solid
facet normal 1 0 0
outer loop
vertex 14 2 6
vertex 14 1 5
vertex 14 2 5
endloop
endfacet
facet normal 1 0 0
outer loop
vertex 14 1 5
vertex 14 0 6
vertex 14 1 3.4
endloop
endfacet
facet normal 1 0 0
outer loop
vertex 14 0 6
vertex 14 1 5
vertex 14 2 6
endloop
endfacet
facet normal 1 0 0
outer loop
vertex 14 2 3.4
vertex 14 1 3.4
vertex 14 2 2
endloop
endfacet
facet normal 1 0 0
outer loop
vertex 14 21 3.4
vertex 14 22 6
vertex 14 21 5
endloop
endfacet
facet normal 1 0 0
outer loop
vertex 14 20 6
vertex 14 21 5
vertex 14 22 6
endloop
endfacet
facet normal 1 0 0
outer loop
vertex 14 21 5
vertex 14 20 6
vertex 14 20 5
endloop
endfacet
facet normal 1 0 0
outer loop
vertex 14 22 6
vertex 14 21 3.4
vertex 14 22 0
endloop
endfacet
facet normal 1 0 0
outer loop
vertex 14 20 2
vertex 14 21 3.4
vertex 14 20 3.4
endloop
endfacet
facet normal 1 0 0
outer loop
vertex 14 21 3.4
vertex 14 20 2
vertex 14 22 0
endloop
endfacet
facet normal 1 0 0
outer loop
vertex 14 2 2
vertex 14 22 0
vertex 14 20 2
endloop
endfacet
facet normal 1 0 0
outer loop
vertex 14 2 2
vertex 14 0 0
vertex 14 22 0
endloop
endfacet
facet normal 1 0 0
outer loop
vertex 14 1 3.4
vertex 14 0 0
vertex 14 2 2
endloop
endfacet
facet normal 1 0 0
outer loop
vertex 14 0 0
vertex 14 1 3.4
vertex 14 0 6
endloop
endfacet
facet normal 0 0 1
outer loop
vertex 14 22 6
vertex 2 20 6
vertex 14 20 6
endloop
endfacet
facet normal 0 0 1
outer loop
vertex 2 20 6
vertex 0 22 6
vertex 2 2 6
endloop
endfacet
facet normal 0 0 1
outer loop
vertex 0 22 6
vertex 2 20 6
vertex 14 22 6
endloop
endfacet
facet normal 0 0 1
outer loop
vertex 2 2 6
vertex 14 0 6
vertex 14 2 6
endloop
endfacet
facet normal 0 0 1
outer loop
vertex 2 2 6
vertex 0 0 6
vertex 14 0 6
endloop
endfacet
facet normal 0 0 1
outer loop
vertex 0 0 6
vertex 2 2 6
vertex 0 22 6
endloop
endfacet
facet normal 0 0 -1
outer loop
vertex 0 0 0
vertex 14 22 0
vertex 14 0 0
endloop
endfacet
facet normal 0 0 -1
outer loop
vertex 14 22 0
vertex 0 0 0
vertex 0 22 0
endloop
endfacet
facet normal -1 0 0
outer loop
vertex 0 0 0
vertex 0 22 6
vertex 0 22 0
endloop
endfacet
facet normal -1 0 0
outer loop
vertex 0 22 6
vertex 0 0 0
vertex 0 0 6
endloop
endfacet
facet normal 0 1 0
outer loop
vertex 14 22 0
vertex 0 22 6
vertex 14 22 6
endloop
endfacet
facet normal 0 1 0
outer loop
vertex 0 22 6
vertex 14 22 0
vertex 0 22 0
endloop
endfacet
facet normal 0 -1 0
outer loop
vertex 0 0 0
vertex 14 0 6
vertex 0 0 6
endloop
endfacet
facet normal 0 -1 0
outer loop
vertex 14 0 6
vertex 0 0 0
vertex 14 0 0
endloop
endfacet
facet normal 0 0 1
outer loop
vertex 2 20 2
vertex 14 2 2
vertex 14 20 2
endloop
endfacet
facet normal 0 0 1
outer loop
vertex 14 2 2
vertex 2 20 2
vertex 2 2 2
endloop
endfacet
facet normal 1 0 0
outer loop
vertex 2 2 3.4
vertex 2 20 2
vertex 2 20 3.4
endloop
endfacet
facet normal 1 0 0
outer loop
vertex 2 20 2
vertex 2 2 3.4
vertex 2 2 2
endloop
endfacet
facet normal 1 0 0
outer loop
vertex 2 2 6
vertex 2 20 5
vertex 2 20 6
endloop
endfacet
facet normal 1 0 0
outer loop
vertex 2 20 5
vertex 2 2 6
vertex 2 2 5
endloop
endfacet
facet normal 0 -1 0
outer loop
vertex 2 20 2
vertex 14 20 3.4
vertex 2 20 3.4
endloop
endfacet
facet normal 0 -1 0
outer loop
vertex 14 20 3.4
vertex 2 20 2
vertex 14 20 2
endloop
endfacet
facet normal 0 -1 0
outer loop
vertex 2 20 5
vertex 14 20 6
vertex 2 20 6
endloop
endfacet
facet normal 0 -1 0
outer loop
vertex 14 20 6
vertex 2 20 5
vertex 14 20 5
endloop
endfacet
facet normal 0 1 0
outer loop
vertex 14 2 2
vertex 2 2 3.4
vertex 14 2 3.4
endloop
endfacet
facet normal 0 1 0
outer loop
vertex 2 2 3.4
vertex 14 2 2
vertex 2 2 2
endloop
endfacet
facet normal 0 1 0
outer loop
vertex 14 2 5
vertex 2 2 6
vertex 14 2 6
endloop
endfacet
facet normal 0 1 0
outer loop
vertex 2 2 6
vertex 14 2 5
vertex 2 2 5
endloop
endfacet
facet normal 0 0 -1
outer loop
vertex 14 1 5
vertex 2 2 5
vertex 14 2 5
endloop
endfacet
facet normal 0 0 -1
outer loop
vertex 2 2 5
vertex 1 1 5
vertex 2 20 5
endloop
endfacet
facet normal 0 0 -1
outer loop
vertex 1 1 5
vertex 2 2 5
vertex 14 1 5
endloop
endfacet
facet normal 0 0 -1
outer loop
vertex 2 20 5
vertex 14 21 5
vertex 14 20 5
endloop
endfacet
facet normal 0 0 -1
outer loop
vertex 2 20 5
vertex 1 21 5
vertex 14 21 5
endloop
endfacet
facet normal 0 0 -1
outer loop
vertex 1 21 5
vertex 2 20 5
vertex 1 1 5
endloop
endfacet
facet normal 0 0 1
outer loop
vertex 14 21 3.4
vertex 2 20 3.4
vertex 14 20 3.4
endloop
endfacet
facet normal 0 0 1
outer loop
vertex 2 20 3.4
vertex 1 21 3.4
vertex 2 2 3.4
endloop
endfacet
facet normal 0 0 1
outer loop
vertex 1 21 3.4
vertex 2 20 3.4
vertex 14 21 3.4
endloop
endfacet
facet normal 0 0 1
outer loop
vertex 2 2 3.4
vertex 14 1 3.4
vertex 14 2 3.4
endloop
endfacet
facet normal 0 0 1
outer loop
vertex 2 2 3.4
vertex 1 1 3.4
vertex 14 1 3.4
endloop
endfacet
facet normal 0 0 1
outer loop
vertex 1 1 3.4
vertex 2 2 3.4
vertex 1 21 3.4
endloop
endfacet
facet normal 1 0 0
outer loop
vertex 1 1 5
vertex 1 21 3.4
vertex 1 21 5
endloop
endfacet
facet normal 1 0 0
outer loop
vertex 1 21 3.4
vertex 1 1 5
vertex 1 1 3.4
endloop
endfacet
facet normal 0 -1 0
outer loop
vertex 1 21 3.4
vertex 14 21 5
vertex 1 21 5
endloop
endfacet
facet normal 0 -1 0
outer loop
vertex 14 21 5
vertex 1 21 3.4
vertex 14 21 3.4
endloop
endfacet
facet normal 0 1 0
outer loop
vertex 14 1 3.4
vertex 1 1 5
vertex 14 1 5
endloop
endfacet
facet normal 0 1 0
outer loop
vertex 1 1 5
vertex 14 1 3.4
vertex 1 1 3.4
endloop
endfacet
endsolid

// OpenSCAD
$fn= 16;

module case1() {
    difference() {
        // case size
        cube([14,22,6]);
        translate([2, 2, 2])cube([14,18,6]);
        translate([1, 1, 3.4])cube([14,20,1.6]);
    };
};

case1();
